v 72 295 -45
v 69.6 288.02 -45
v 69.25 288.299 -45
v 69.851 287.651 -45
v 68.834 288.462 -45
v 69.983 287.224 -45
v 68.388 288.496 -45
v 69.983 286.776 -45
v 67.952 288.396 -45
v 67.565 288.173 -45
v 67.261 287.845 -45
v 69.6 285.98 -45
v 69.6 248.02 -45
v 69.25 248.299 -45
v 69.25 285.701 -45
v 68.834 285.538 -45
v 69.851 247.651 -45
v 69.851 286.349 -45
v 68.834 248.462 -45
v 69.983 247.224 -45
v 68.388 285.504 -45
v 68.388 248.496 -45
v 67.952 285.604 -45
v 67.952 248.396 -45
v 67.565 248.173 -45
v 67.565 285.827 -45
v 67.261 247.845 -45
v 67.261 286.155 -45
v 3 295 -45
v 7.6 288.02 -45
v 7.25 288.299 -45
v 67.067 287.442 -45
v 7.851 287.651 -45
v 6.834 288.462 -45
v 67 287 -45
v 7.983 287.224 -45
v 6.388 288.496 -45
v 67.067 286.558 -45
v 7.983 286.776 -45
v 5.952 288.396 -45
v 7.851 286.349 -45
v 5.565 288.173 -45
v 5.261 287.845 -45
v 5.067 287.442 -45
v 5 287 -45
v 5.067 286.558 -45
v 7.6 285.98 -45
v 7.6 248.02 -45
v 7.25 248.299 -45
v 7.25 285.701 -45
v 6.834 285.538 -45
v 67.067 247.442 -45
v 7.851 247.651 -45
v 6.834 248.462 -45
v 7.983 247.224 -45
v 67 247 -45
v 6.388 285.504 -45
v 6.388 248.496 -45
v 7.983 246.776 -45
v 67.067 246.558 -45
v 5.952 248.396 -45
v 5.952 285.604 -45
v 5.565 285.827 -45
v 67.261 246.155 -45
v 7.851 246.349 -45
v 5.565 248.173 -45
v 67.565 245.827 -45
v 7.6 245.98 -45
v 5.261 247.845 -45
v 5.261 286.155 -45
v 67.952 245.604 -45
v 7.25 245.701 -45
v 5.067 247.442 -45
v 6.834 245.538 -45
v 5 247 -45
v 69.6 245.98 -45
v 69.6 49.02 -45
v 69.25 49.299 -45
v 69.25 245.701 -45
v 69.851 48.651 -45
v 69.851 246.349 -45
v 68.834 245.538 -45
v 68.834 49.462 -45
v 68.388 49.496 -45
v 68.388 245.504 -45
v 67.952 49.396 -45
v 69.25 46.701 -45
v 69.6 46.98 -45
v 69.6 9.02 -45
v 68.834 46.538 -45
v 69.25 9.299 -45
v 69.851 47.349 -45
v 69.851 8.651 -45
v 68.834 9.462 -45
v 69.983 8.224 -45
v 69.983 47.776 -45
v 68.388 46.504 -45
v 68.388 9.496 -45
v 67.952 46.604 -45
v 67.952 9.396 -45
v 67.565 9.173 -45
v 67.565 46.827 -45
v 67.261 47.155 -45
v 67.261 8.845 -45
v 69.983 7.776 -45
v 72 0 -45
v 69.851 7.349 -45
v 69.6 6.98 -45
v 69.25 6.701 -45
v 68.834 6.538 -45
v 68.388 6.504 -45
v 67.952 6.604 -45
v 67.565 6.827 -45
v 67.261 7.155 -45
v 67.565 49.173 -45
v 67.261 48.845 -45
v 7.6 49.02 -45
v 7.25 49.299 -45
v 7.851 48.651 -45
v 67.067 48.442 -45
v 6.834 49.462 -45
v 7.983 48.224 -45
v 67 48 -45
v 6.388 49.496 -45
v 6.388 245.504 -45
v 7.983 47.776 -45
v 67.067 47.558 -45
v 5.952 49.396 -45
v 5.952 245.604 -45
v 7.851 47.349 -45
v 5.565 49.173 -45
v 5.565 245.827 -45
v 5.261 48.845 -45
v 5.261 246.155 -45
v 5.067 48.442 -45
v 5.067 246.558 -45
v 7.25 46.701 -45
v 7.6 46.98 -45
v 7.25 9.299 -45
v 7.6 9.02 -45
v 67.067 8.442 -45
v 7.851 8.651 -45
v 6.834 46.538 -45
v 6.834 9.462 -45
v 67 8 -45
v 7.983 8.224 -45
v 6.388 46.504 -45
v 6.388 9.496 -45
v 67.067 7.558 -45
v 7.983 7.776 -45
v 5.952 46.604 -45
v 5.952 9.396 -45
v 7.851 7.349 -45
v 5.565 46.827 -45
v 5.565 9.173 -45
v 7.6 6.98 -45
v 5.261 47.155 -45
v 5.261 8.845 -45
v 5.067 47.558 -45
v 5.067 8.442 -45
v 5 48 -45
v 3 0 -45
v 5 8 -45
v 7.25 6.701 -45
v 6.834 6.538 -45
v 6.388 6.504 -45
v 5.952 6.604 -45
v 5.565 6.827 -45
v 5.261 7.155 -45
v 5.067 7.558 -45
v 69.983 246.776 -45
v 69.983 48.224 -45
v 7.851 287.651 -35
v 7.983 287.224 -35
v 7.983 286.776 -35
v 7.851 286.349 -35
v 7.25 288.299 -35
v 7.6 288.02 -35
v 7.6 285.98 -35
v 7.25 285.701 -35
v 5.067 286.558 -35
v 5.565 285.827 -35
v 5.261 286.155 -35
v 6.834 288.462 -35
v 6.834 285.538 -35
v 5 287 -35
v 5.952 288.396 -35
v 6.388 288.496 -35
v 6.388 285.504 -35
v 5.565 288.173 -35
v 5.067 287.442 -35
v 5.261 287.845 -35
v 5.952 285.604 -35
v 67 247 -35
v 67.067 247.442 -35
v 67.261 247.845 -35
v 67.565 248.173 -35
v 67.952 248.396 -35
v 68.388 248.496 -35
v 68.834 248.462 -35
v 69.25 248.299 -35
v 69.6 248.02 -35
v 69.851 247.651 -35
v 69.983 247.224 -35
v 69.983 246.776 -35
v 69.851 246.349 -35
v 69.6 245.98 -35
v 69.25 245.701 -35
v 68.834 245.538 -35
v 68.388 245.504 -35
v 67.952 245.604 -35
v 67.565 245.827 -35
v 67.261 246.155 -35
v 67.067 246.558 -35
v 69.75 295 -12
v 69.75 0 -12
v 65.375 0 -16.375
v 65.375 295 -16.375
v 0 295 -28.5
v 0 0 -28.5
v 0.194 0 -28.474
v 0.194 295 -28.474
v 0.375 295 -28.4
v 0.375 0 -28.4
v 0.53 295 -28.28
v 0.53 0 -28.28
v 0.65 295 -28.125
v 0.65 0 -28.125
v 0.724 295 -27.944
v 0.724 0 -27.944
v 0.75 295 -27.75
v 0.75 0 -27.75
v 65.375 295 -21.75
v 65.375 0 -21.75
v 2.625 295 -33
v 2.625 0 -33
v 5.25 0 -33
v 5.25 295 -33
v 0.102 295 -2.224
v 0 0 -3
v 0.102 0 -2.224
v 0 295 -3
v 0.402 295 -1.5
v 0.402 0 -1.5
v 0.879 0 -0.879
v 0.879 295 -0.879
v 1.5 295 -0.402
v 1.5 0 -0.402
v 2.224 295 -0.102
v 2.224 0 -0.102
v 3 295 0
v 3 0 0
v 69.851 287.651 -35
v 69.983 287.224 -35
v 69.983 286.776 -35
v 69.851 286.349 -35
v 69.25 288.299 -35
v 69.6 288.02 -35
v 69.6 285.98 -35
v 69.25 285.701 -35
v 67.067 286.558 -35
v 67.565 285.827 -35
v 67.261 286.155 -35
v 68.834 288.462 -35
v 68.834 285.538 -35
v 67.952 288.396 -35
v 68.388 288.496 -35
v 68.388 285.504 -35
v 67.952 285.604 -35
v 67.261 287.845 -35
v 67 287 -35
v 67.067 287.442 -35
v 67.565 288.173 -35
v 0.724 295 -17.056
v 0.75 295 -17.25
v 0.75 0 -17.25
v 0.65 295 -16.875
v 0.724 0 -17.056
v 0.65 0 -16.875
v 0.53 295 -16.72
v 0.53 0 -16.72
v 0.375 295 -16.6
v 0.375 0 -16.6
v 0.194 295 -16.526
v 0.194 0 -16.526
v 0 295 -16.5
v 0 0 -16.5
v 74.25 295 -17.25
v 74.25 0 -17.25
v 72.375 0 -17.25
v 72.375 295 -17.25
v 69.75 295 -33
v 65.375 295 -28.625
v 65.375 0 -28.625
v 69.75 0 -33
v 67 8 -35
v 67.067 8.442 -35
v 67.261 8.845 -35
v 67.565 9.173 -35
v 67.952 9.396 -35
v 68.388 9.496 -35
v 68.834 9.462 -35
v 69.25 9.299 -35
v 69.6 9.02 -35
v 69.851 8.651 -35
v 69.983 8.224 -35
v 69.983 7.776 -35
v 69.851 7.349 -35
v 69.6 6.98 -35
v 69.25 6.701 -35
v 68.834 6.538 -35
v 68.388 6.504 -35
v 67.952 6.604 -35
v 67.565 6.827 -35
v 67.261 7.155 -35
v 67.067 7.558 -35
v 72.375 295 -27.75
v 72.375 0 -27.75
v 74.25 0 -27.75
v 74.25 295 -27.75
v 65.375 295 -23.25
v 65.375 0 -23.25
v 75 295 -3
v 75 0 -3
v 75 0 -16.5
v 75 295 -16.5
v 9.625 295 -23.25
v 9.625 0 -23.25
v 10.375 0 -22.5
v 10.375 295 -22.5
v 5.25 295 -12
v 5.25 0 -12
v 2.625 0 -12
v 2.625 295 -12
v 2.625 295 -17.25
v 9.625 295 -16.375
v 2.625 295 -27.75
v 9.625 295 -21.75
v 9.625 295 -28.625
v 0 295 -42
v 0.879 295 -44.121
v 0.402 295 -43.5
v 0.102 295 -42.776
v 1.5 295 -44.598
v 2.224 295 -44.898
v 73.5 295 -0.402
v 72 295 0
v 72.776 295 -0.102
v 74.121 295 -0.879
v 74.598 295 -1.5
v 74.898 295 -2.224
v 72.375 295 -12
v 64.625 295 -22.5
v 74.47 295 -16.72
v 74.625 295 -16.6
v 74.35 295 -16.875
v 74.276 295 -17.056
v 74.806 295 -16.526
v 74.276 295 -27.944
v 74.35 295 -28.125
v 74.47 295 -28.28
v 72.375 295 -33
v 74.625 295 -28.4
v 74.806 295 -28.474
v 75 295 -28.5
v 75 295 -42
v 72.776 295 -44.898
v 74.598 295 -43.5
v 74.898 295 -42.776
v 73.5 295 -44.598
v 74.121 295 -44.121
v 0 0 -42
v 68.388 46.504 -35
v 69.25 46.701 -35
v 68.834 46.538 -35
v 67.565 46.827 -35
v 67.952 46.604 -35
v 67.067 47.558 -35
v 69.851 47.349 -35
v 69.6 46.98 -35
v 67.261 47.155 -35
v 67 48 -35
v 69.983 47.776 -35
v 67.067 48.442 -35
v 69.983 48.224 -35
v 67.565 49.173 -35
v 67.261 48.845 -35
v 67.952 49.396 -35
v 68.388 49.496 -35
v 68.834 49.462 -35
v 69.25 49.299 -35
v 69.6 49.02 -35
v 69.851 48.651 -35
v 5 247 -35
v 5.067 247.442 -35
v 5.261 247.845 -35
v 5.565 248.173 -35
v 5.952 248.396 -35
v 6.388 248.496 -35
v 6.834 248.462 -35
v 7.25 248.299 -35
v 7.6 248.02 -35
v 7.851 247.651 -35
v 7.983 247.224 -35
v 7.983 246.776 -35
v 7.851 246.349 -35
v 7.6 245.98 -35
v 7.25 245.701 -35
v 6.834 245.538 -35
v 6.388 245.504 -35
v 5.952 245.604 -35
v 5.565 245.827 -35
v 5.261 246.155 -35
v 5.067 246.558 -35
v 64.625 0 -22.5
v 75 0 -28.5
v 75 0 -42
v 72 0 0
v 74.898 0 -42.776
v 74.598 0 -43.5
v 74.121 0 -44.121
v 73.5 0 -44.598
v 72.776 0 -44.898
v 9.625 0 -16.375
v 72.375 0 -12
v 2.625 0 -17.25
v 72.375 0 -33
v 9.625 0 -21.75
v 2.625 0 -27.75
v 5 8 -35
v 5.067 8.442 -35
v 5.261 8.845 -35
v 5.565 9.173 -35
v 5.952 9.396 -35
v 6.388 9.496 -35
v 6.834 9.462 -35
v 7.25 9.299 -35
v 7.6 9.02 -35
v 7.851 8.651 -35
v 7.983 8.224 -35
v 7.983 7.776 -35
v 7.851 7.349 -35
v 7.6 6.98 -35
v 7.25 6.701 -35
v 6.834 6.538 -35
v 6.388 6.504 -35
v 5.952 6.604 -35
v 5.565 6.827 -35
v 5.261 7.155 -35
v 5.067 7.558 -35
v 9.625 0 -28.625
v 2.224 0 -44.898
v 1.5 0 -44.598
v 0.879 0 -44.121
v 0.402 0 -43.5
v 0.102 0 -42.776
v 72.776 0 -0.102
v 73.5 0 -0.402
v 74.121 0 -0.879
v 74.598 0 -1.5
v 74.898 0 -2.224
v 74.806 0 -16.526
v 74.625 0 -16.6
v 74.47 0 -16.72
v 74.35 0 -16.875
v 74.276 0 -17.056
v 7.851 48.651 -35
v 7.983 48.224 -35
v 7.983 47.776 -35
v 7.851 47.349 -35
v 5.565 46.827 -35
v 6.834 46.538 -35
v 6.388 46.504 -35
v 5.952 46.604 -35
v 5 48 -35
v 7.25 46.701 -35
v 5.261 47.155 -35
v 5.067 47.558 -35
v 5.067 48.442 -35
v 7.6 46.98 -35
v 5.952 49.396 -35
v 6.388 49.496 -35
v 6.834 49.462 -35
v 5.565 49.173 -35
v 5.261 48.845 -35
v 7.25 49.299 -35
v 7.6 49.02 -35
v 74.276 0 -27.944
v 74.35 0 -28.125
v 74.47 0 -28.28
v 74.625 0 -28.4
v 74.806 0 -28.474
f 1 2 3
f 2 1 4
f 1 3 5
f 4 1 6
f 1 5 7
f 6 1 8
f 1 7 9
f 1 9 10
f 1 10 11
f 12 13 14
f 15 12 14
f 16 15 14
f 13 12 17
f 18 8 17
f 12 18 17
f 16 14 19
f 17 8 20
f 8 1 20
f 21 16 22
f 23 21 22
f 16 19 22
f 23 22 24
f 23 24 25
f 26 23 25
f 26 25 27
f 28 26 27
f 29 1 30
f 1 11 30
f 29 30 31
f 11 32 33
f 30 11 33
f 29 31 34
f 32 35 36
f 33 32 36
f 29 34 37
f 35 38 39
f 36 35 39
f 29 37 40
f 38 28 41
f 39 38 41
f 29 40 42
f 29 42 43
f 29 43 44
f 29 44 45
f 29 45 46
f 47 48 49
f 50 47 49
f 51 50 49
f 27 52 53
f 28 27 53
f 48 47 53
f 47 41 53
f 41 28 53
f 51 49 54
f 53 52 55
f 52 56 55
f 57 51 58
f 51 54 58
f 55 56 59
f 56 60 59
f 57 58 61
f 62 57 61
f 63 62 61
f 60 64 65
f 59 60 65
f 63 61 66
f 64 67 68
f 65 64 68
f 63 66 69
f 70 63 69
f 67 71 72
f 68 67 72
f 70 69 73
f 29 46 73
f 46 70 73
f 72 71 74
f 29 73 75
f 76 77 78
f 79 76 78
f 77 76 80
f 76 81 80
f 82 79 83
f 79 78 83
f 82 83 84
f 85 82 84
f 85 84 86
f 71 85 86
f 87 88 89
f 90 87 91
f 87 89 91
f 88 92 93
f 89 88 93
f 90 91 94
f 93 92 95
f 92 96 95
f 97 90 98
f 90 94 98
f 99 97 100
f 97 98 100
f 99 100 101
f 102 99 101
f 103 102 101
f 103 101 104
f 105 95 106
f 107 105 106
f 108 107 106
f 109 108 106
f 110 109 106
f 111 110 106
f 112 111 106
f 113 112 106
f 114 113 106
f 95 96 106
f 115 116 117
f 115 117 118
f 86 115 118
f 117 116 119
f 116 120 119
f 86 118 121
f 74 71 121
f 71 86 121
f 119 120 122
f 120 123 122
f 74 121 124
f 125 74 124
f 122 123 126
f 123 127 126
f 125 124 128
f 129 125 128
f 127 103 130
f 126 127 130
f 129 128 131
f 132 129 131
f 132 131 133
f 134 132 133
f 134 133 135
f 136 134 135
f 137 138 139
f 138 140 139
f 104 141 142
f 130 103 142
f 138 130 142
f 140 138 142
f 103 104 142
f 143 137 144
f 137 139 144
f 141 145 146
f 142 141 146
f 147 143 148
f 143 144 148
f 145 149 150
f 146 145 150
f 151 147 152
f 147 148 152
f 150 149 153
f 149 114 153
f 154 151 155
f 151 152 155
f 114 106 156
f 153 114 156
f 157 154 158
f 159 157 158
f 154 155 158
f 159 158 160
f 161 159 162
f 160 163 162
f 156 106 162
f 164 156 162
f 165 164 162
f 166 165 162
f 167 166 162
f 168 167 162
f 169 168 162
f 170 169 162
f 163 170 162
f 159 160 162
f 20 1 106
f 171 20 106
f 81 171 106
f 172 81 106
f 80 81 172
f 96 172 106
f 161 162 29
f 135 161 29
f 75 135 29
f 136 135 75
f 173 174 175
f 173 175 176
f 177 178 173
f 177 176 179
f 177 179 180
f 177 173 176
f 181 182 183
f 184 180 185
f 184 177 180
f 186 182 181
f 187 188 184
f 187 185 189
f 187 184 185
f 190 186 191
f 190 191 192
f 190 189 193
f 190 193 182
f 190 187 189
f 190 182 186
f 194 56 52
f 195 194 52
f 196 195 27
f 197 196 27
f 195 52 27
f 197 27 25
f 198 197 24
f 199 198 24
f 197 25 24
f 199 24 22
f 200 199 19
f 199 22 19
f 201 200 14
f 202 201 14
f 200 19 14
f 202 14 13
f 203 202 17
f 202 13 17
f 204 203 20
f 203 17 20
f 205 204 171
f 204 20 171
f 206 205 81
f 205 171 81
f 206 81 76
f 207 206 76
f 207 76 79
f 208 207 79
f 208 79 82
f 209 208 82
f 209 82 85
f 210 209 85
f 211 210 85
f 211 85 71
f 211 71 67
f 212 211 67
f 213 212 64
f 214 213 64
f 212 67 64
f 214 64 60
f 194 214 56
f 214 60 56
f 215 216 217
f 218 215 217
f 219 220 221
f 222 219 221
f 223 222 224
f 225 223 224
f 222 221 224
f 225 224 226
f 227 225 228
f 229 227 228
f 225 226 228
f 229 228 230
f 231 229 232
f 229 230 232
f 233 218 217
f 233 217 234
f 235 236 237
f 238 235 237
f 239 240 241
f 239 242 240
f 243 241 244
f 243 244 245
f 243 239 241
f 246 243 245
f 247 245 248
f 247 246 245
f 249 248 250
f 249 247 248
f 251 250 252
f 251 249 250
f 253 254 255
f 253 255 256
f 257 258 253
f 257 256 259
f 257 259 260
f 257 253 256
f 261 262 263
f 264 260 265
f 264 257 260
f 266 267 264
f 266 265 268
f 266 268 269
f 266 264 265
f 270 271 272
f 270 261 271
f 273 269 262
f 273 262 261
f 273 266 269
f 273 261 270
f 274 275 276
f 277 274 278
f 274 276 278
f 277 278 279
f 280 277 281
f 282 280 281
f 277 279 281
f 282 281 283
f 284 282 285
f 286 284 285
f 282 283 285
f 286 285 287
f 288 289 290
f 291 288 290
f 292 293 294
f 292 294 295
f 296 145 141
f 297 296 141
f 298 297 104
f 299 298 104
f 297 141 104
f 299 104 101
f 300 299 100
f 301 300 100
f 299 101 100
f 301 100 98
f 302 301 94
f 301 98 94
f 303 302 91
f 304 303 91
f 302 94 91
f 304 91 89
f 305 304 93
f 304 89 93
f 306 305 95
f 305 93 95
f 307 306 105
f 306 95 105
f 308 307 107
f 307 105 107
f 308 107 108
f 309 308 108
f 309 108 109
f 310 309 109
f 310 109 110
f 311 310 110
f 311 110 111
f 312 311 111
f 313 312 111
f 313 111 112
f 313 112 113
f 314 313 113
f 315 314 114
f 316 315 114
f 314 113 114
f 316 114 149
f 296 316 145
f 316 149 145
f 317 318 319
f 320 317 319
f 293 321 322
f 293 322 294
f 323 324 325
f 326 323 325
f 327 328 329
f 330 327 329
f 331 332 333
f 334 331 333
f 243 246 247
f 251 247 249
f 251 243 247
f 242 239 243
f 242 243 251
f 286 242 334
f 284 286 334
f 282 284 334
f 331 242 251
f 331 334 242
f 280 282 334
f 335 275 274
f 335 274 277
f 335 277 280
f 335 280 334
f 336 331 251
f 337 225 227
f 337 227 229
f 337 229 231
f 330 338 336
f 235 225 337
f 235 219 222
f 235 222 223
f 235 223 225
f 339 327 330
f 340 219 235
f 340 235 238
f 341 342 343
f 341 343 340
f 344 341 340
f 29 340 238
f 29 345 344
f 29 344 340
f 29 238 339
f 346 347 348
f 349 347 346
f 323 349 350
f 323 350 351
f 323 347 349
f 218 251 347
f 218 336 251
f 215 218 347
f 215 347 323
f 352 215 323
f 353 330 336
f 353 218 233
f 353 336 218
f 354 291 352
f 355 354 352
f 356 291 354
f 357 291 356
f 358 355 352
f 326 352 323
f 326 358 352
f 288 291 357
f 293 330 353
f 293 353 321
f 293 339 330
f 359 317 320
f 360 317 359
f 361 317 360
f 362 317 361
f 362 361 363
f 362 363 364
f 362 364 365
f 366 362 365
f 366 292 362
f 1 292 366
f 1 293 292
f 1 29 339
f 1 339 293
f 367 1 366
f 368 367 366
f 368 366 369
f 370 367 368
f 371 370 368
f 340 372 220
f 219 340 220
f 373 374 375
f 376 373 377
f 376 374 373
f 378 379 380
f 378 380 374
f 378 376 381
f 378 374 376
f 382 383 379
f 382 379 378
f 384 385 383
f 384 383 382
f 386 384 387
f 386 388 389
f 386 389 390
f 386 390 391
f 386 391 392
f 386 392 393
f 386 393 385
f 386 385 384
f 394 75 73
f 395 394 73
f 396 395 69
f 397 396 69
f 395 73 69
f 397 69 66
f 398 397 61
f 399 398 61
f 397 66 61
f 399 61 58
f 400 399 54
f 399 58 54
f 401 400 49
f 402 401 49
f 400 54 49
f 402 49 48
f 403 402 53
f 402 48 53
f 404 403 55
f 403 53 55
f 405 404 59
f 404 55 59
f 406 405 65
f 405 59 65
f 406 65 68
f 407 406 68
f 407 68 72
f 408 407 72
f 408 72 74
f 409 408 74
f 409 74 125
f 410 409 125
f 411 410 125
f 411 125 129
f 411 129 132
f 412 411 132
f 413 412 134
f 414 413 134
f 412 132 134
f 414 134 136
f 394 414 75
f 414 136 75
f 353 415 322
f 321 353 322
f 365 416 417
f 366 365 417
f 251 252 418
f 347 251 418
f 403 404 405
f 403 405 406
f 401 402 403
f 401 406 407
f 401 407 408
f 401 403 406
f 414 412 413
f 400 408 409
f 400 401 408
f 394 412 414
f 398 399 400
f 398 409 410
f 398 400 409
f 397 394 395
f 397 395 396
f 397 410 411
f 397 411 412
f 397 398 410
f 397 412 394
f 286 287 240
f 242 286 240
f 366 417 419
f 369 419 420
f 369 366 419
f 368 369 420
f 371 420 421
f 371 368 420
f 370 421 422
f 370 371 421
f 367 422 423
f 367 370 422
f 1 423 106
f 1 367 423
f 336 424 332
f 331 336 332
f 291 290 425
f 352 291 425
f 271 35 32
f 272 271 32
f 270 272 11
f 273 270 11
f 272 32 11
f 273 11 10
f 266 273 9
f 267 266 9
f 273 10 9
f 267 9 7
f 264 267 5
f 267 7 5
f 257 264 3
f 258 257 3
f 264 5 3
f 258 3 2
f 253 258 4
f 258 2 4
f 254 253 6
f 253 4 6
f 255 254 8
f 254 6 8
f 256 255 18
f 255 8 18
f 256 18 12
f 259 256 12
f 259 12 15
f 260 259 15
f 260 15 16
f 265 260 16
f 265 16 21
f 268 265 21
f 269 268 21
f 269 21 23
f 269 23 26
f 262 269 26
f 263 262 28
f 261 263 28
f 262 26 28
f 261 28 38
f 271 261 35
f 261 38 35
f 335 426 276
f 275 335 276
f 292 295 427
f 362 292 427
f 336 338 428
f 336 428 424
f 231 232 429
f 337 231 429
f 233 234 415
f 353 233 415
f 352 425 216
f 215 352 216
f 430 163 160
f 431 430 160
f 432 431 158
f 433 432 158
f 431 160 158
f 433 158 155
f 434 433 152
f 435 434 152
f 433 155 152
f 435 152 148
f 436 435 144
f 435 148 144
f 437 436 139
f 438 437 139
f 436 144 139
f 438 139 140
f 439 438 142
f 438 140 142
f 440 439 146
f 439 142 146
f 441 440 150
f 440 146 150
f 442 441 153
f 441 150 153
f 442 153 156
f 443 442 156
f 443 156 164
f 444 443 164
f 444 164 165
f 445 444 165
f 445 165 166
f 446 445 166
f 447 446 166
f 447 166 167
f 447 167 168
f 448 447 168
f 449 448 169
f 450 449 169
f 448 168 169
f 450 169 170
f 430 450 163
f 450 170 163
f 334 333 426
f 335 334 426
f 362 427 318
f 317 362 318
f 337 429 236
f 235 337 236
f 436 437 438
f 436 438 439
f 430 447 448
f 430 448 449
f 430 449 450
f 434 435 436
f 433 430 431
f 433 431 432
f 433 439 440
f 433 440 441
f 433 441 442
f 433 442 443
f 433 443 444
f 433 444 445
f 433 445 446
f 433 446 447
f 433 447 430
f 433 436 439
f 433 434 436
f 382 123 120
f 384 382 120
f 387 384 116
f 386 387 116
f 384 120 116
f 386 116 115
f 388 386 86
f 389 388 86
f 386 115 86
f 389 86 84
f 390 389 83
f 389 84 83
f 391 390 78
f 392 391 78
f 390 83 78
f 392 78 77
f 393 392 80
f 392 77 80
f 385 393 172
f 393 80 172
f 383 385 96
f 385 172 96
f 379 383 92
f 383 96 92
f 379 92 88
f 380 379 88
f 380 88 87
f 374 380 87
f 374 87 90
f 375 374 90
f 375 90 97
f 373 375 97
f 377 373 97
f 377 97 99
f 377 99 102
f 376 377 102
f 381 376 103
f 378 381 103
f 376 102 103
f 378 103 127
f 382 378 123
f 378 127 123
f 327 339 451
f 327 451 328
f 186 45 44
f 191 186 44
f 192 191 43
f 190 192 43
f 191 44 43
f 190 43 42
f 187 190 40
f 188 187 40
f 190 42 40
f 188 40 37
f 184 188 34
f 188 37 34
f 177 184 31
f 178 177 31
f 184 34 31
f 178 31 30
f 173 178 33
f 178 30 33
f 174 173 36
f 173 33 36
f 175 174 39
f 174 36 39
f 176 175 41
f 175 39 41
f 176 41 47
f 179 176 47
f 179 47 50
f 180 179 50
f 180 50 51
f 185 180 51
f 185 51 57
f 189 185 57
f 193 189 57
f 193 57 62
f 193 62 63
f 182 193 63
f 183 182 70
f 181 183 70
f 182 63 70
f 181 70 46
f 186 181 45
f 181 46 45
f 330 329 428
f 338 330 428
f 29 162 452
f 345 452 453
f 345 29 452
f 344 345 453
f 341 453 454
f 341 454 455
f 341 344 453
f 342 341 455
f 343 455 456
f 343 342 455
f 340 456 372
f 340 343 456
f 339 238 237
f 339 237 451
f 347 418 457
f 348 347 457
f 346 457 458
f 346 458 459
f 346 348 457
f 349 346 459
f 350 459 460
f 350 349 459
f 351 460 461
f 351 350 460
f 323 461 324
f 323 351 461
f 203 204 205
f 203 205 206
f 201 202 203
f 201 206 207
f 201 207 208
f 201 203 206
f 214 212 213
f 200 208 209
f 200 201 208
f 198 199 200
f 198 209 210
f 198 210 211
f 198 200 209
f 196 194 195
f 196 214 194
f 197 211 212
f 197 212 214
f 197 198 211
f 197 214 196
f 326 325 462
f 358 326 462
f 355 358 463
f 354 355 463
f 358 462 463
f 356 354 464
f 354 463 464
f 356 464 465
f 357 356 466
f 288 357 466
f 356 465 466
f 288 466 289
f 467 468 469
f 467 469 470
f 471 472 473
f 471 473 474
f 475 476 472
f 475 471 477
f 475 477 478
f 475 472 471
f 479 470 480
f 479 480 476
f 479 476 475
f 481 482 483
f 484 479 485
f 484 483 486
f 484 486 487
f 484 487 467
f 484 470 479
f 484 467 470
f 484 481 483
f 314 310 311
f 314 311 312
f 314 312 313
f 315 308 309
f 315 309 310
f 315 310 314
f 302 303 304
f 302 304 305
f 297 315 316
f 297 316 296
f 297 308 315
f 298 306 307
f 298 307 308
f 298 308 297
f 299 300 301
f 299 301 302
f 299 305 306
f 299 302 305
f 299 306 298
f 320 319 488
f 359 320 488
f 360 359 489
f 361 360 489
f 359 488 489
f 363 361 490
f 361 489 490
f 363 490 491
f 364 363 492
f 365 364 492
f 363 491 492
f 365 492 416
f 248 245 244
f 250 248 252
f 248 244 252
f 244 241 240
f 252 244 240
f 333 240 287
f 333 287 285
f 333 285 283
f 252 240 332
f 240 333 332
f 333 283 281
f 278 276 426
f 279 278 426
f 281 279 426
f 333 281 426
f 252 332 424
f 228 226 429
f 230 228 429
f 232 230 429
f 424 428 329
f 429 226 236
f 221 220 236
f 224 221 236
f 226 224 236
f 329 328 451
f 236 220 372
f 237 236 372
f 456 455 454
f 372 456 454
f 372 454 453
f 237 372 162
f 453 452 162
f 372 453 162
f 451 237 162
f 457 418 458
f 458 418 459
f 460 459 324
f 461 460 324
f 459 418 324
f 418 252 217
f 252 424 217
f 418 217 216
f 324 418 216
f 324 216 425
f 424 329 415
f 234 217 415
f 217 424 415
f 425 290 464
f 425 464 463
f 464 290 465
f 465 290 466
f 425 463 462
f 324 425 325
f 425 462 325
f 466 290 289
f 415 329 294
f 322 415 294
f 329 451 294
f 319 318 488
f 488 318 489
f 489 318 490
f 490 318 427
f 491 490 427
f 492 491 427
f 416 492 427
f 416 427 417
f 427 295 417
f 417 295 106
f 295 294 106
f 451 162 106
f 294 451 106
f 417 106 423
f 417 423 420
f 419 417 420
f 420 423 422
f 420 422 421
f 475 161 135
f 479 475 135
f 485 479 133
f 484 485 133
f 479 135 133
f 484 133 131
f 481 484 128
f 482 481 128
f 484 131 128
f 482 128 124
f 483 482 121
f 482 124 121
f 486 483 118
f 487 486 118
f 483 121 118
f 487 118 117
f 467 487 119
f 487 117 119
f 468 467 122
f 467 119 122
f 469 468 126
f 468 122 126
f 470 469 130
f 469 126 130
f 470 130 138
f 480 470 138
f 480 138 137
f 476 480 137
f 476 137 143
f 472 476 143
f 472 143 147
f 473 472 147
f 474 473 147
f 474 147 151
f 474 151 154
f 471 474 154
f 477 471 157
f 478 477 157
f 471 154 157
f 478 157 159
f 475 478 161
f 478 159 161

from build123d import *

# Parameters (mm, degrees)
BOSS_EXTRUDE1_DEPTH = 295
FILLET1_R           = 3
SKETCH2_R           = 1.5
CUT_EXTRUDE1_DEPTH  = 10


with BuildPart() as part:
    # Sketch1 → Boss-Extrude1 (new body)
    with BuildSketch(Plane(origin=(0, 0, 0), x_dir=(1, 0, 0), z_dir=(0, 1, 0))):
        with BuildLine():
            Line((2.625, 17.250000178), (0.75, 17.250000178))
            ThreePointArc((0.75, 17.250000178), (0.530330086, 16.719670092), (0, 16.500000178))
            Line((0, 16.500000178), (0, 0))
            Line((0, 0), (75, 0))
            Line((75, 0), (75, 16.500000178))
            ThreePointArc((75, 16.500000178), (74.469669914, 16.719670092), (74.25, 17.250000178))
            Line((74.25, 17.250000178), (72.375, 17.250000178))
            Line((72.375, 17.250000178), (72.375, 12.000000178))
            Line((72.375, 12.000000178), (69.75, 12.000000178))
            Line((69.75, 12.000000178), (65.375, 16.375))
            Line((65.375, 16.375), (65.375, 21.75))
            Line((65.375, 21.75), (64.625, 22.5))
            Line((64.625, 22.5), (65.375, 23.25))
            Line((65.375, 23.25), (65.375, 28.625))
            Line((65.375, 28.625), (69.75, 33.000000178))
            Line((69.75, 33.000000178), (72.375, 33.000000178))
            Line((72.375, 33.000000178), (72.375, 27.750000178))
            Line((72.375, 27.750000178), (74.25, 27.750000178))
            ThreePointArc((74.25, 27.750000178), (74.469669914, 28.280330264), (75, 28.500000178))
            Line((75, 28.500000178), (75, 45))
            Line((75, 45), (0, 45))
            Line((0, 45), (0, 28.500000178))
            ThreePointArc((0, 28.500000178), (0.530330086, 28.280330264), (0.75, 27.750000178))
            Line((0.75, 27.750000178), (2.625, 27.750000178))
            Line((2.625, 27.750000178), (2.625, 33.000000178))
            Line((2.625, 33.000000178), (5.25, 33.000000178))
            Line((5.25, 33.000000178), (9.625, 28.625))
            Line((9.625, 28.625), (9.625, 23.25))
            Line((9.625, 23.25), (10.375, 22.5))
            Line((10.375, 22.5), (9.625, 21.75))
            Line((9.625, 21.75), (9.625, 16.375))
            Line((9.625, 16.375), (5.25, 12.000000178))
            Line((5.25, 12.000000178), (2.625, 12.000000178))
            Line((2.625, 12.000000178), (2.625, 17.250000178))
        make_face()
    extrude(amount=BOSS_EXTRUDE1_DEPTH)

    # Fillet1
    fillet1_edges = [part.edges().sort_by_distance(p)[0] for p in [
        (0, 147.5, 0),
        (0, 147.5, -45),
        (75, 147.5, -45),
        (75, 147.5, 0),
    ]]
    fillet(fillet1_edges, radius=FILLET1_R)

    # Sketch2 → Cut-Extrude1 (cut)
    with BuildSketch(Plane(origin=(0, 0, -45), x_dir=(-1, 0, 0), z_dir=(0, 0, -1))):
        with Locations((-6.5, 287)):
            Circle(SKETCH2_R)
        with Locations((-6.5, 247)):
            Circle(SKETCH2_R)
        with Locations((-6.5, 48)):
            Circle(SKETCH2_R)
        with Locations((-6.5, 8)):
            Circle(SKETCH2_R)
        with Locations((-68.5, 8)):
            Circle(SKETCH2_R)
        with Locations((-68.5, 48)):
            Circle(SKETCH2_R)
        with Locations((-68.5, 287)):
            Circle(SKETCH2_R)
        with Locations((-68.5, 247)):
            Circle(SKETCH2_R)
    extrude(amount=-CUT_EXTRUDE1_DEPTH, mode=Mode.SUBTRACT)


solid = part.part
